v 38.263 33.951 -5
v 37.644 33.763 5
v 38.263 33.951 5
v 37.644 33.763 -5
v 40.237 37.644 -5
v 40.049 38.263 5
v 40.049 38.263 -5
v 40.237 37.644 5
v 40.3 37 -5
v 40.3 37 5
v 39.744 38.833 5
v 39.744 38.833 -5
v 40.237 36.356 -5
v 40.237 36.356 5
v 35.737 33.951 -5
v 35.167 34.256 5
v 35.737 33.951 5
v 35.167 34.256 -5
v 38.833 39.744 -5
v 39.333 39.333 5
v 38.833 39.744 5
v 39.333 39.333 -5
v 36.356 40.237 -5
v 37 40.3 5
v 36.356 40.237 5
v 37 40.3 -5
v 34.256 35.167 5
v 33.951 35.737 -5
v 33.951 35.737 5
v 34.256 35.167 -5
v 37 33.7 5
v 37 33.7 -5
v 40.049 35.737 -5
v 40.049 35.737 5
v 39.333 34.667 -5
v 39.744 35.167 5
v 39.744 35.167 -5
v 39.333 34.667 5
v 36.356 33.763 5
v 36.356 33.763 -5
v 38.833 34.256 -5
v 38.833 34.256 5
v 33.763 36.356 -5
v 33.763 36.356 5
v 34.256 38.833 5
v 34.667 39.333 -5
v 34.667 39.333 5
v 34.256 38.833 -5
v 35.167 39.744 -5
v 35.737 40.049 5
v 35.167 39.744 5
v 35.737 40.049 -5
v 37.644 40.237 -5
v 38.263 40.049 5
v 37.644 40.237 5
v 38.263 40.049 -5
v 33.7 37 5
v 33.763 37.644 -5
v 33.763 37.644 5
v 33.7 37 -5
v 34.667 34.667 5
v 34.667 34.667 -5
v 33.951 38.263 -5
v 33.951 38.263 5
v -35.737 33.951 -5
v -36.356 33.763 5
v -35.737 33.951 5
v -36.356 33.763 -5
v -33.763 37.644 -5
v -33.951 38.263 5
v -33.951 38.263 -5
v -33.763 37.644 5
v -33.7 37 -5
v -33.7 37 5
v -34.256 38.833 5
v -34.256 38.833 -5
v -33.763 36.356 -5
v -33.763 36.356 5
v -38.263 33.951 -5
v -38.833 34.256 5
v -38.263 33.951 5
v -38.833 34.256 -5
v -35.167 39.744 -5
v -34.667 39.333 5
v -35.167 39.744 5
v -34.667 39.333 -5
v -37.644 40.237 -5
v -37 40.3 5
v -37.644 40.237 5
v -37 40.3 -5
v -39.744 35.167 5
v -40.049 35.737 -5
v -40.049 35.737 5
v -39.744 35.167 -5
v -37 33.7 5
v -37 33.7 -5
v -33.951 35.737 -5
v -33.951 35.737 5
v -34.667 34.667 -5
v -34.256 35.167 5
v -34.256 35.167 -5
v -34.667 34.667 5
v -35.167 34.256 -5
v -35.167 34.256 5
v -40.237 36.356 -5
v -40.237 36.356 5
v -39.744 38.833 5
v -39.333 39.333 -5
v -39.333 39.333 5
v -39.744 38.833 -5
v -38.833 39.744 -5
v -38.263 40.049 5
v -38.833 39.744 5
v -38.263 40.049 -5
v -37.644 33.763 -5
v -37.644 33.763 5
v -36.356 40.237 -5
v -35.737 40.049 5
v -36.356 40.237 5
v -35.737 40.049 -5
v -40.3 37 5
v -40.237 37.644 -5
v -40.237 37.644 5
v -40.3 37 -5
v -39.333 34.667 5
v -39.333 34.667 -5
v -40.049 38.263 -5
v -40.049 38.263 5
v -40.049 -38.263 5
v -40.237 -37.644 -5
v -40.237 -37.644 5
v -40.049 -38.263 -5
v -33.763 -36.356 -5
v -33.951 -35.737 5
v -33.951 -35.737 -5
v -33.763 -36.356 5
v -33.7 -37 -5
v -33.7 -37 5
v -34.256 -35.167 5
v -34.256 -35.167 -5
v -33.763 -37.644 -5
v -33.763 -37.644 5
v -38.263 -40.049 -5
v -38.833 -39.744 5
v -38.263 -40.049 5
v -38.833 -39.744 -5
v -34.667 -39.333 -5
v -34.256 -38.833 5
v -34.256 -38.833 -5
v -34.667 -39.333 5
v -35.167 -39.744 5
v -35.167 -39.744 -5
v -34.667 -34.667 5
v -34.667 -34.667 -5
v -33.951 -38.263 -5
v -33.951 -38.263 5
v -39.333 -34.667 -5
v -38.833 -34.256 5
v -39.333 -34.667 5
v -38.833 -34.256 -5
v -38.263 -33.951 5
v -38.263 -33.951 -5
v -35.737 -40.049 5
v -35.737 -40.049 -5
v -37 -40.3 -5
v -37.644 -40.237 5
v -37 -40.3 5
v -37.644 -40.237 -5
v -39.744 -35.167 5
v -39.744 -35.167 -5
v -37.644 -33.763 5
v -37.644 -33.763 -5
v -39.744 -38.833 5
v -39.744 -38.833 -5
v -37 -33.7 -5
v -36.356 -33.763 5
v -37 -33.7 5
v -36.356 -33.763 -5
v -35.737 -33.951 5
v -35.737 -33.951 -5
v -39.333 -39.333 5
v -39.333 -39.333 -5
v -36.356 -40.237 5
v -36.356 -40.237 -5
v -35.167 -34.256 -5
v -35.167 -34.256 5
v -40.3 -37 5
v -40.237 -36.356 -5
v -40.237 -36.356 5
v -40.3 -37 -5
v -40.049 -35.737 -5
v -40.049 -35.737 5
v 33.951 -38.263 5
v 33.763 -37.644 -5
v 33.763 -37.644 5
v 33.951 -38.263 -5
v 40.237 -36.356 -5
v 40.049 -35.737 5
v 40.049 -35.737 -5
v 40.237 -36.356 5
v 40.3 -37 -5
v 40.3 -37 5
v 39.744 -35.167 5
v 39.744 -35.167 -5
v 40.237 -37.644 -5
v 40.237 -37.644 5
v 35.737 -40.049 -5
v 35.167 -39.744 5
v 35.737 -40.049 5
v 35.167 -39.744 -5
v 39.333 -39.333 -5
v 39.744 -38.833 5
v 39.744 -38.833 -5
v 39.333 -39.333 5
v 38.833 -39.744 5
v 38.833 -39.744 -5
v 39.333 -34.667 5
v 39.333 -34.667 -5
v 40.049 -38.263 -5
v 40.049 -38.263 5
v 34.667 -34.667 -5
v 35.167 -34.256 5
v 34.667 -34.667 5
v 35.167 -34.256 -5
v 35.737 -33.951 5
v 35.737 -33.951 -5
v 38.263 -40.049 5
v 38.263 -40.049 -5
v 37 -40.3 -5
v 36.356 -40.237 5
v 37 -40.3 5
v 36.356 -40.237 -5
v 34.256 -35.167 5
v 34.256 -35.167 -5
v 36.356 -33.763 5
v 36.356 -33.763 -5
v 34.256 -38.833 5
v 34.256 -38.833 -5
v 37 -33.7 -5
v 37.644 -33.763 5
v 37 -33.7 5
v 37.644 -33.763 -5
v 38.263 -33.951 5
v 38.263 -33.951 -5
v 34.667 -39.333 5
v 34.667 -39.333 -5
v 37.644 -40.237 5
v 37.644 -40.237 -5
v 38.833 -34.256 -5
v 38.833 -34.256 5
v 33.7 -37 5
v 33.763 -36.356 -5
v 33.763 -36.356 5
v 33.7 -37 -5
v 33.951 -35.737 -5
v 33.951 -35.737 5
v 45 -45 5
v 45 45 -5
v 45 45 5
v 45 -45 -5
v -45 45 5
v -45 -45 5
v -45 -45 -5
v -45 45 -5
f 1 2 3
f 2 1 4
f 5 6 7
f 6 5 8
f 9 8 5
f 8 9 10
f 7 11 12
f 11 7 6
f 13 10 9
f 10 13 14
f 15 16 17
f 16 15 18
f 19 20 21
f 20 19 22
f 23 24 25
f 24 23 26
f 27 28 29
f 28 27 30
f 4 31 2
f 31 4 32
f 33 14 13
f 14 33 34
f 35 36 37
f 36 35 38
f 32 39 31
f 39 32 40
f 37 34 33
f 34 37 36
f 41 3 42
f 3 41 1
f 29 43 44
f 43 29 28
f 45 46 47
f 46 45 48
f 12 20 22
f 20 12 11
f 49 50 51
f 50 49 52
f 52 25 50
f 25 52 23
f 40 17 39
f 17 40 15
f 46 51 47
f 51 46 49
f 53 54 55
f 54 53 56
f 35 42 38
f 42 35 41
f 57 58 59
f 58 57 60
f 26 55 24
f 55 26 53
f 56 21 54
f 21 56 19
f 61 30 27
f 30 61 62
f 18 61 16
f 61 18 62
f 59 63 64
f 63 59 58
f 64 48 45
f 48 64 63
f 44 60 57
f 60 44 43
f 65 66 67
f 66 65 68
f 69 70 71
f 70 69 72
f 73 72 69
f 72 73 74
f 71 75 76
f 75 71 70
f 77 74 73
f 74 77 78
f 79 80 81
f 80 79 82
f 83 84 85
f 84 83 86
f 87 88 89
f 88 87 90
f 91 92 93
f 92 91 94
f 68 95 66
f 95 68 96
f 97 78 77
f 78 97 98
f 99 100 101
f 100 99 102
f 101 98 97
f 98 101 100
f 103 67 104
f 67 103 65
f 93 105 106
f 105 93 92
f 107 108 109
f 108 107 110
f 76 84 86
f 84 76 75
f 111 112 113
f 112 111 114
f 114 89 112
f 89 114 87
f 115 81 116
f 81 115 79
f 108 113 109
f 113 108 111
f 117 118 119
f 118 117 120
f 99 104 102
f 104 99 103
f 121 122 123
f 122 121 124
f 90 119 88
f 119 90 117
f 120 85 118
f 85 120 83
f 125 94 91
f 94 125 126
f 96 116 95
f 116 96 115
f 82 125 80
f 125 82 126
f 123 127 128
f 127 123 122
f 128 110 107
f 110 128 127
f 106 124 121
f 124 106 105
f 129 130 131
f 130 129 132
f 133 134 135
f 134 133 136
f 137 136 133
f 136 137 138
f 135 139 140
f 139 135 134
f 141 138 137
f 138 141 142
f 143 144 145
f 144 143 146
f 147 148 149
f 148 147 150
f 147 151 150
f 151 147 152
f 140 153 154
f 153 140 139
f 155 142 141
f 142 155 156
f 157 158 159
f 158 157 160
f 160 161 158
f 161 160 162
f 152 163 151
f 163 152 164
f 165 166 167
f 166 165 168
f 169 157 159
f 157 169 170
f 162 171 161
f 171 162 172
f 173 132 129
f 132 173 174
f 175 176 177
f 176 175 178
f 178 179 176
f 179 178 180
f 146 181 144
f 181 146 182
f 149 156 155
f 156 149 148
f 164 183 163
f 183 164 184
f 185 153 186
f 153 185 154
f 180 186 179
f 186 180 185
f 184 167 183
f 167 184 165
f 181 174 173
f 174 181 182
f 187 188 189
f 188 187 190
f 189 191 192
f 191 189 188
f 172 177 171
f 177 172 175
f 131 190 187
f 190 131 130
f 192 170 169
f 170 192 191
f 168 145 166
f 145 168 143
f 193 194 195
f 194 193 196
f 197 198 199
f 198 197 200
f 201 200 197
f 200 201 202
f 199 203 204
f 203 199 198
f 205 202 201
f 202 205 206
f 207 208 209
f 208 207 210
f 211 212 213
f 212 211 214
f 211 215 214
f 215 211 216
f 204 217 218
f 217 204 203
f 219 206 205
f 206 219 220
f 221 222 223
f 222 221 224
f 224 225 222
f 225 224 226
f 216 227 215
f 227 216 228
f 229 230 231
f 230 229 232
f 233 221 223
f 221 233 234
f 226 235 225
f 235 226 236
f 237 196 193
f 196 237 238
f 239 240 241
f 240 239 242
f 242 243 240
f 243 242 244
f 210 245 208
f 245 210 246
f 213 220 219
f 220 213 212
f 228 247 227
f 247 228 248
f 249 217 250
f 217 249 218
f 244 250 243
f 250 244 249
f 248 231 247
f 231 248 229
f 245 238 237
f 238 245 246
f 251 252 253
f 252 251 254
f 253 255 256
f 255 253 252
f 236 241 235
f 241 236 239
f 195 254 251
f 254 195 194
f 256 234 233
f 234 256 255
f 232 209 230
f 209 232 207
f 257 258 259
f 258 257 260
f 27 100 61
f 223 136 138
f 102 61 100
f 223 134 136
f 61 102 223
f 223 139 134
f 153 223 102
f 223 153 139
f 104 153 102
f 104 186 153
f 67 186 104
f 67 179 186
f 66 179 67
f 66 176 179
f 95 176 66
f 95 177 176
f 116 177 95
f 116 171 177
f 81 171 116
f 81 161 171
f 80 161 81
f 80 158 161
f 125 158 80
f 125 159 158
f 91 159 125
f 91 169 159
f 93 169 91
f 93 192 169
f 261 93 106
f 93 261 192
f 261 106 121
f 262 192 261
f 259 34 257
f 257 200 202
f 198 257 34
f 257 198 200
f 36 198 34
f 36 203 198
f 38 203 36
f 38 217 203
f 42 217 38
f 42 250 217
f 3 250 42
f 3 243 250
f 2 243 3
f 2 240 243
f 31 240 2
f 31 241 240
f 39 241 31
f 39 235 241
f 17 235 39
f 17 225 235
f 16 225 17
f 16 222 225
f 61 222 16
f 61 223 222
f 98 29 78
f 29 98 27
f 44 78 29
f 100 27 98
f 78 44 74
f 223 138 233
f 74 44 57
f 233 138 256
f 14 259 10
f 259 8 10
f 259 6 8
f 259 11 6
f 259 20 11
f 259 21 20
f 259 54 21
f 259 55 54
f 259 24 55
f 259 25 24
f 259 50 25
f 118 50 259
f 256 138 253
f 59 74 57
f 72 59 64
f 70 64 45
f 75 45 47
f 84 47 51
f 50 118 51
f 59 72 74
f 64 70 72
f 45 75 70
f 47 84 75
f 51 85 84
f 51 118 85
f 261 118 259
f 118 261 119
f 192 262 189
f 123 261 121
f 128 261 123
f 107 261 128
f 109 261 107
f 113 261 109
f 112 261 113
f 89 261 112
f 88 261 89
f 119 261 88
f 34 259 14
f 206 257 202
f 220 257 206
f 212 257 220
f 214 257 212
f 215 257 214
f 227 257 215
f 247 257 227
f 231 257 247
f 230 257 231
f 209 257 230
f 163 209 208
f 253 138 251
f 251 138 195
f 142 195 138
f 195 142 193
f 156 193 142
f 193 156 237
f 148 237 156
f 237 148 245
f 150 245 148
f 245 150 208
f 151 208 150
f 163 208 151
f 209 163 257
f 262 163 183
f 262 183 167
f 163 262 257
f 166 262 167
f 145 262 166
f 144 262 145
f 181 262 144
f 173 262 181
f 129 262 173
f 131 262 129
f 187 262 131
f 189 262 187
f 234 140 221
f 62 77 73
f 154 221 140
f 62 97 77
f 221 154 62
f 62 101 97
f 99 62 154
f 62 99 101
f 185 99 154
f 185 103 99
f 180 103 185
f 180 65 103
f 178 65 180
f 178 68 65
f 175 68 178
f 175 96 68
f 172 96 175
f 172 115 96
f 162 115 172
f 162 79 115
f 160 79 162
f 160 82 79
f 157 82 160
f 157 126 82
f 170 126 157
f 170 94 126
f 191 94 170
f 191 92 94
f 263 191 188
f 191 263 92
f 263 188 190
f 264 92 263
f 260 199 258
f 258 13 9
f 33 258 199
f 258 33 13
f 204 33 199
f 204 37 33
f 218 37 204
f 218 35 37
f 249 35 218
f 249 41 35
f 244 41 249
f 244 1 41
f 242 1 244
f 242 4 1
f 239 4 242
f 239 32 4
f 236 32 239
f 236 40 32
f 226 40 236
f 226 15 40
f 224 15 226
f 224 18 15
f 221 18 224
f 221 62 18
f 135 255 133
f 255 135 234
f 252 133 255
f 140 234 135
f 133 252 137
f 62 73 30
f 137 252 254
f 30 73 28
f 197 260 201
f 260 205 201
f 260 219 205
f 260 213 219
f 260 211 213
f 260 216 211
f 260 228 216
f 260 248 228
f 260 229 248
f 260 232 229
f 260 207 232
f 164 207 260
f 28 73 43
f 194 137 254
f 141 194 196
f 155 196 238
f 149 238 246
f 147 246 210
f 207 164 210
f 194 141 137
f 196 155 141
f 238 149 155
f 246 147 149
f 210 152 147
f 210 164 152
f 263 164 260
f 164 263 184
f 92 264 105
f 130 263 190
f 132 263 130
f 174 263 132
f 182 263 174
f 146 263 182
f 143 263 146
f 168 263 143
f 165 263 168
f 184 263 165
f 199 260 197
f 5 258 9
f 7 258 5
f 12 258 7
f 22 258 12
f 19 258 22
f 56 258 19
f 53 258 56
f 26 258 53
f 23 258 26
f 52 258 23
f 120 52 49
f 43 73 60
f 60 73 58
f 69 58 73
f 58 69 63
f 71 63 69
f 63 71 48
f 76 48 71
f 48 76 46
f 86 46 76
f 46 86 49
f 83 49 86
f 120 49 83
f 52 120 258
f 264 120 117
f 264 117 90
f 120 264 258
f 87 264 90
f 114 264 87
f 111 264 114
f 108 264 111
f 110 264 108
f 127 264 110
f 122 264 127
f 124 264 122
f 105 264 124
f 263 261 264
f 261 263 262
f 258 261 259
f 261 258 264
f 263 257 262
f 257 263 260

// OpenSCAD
$fn = 32;

// ----------------------------------------------------------------------
// Corner plate 90 x 90 x 10
// 4 holes, centres taken from the edge offset
// ----------------------------------------------------------------------

// --- parameters (mm) ---
plate = [90, 90, 10];  // overall size (x, y, z)
holes = 4;             // number of holes the drawing asks for
hole_d = 6.6;          // hole diameter
edge = 8;              // hole centre offset from the plate edge

// --- derived feature positions (mm) ---
corner_x = plate[0] / 2 - edge;  // = 37   corner hole X
corner_y = plate[1] / 2 - edge;  // = 37   corner hole Y
feature_centers = [
  [corner_x, corner_y],
  [-corner_x, corner_y],
  [-corner_x, -corner_y],
  [corner_x, -corner_y]
];   // hole centres the loop below drills

// plate outline, every hole drilled through with the same cutters
difference() {
  cube(plate, center = true);
  for (centre = feature_centers)
    translate([centre[0], centre[1], 0])
      cylinder(d = hole_d, h = plate[2] + 2, center = true);
}
